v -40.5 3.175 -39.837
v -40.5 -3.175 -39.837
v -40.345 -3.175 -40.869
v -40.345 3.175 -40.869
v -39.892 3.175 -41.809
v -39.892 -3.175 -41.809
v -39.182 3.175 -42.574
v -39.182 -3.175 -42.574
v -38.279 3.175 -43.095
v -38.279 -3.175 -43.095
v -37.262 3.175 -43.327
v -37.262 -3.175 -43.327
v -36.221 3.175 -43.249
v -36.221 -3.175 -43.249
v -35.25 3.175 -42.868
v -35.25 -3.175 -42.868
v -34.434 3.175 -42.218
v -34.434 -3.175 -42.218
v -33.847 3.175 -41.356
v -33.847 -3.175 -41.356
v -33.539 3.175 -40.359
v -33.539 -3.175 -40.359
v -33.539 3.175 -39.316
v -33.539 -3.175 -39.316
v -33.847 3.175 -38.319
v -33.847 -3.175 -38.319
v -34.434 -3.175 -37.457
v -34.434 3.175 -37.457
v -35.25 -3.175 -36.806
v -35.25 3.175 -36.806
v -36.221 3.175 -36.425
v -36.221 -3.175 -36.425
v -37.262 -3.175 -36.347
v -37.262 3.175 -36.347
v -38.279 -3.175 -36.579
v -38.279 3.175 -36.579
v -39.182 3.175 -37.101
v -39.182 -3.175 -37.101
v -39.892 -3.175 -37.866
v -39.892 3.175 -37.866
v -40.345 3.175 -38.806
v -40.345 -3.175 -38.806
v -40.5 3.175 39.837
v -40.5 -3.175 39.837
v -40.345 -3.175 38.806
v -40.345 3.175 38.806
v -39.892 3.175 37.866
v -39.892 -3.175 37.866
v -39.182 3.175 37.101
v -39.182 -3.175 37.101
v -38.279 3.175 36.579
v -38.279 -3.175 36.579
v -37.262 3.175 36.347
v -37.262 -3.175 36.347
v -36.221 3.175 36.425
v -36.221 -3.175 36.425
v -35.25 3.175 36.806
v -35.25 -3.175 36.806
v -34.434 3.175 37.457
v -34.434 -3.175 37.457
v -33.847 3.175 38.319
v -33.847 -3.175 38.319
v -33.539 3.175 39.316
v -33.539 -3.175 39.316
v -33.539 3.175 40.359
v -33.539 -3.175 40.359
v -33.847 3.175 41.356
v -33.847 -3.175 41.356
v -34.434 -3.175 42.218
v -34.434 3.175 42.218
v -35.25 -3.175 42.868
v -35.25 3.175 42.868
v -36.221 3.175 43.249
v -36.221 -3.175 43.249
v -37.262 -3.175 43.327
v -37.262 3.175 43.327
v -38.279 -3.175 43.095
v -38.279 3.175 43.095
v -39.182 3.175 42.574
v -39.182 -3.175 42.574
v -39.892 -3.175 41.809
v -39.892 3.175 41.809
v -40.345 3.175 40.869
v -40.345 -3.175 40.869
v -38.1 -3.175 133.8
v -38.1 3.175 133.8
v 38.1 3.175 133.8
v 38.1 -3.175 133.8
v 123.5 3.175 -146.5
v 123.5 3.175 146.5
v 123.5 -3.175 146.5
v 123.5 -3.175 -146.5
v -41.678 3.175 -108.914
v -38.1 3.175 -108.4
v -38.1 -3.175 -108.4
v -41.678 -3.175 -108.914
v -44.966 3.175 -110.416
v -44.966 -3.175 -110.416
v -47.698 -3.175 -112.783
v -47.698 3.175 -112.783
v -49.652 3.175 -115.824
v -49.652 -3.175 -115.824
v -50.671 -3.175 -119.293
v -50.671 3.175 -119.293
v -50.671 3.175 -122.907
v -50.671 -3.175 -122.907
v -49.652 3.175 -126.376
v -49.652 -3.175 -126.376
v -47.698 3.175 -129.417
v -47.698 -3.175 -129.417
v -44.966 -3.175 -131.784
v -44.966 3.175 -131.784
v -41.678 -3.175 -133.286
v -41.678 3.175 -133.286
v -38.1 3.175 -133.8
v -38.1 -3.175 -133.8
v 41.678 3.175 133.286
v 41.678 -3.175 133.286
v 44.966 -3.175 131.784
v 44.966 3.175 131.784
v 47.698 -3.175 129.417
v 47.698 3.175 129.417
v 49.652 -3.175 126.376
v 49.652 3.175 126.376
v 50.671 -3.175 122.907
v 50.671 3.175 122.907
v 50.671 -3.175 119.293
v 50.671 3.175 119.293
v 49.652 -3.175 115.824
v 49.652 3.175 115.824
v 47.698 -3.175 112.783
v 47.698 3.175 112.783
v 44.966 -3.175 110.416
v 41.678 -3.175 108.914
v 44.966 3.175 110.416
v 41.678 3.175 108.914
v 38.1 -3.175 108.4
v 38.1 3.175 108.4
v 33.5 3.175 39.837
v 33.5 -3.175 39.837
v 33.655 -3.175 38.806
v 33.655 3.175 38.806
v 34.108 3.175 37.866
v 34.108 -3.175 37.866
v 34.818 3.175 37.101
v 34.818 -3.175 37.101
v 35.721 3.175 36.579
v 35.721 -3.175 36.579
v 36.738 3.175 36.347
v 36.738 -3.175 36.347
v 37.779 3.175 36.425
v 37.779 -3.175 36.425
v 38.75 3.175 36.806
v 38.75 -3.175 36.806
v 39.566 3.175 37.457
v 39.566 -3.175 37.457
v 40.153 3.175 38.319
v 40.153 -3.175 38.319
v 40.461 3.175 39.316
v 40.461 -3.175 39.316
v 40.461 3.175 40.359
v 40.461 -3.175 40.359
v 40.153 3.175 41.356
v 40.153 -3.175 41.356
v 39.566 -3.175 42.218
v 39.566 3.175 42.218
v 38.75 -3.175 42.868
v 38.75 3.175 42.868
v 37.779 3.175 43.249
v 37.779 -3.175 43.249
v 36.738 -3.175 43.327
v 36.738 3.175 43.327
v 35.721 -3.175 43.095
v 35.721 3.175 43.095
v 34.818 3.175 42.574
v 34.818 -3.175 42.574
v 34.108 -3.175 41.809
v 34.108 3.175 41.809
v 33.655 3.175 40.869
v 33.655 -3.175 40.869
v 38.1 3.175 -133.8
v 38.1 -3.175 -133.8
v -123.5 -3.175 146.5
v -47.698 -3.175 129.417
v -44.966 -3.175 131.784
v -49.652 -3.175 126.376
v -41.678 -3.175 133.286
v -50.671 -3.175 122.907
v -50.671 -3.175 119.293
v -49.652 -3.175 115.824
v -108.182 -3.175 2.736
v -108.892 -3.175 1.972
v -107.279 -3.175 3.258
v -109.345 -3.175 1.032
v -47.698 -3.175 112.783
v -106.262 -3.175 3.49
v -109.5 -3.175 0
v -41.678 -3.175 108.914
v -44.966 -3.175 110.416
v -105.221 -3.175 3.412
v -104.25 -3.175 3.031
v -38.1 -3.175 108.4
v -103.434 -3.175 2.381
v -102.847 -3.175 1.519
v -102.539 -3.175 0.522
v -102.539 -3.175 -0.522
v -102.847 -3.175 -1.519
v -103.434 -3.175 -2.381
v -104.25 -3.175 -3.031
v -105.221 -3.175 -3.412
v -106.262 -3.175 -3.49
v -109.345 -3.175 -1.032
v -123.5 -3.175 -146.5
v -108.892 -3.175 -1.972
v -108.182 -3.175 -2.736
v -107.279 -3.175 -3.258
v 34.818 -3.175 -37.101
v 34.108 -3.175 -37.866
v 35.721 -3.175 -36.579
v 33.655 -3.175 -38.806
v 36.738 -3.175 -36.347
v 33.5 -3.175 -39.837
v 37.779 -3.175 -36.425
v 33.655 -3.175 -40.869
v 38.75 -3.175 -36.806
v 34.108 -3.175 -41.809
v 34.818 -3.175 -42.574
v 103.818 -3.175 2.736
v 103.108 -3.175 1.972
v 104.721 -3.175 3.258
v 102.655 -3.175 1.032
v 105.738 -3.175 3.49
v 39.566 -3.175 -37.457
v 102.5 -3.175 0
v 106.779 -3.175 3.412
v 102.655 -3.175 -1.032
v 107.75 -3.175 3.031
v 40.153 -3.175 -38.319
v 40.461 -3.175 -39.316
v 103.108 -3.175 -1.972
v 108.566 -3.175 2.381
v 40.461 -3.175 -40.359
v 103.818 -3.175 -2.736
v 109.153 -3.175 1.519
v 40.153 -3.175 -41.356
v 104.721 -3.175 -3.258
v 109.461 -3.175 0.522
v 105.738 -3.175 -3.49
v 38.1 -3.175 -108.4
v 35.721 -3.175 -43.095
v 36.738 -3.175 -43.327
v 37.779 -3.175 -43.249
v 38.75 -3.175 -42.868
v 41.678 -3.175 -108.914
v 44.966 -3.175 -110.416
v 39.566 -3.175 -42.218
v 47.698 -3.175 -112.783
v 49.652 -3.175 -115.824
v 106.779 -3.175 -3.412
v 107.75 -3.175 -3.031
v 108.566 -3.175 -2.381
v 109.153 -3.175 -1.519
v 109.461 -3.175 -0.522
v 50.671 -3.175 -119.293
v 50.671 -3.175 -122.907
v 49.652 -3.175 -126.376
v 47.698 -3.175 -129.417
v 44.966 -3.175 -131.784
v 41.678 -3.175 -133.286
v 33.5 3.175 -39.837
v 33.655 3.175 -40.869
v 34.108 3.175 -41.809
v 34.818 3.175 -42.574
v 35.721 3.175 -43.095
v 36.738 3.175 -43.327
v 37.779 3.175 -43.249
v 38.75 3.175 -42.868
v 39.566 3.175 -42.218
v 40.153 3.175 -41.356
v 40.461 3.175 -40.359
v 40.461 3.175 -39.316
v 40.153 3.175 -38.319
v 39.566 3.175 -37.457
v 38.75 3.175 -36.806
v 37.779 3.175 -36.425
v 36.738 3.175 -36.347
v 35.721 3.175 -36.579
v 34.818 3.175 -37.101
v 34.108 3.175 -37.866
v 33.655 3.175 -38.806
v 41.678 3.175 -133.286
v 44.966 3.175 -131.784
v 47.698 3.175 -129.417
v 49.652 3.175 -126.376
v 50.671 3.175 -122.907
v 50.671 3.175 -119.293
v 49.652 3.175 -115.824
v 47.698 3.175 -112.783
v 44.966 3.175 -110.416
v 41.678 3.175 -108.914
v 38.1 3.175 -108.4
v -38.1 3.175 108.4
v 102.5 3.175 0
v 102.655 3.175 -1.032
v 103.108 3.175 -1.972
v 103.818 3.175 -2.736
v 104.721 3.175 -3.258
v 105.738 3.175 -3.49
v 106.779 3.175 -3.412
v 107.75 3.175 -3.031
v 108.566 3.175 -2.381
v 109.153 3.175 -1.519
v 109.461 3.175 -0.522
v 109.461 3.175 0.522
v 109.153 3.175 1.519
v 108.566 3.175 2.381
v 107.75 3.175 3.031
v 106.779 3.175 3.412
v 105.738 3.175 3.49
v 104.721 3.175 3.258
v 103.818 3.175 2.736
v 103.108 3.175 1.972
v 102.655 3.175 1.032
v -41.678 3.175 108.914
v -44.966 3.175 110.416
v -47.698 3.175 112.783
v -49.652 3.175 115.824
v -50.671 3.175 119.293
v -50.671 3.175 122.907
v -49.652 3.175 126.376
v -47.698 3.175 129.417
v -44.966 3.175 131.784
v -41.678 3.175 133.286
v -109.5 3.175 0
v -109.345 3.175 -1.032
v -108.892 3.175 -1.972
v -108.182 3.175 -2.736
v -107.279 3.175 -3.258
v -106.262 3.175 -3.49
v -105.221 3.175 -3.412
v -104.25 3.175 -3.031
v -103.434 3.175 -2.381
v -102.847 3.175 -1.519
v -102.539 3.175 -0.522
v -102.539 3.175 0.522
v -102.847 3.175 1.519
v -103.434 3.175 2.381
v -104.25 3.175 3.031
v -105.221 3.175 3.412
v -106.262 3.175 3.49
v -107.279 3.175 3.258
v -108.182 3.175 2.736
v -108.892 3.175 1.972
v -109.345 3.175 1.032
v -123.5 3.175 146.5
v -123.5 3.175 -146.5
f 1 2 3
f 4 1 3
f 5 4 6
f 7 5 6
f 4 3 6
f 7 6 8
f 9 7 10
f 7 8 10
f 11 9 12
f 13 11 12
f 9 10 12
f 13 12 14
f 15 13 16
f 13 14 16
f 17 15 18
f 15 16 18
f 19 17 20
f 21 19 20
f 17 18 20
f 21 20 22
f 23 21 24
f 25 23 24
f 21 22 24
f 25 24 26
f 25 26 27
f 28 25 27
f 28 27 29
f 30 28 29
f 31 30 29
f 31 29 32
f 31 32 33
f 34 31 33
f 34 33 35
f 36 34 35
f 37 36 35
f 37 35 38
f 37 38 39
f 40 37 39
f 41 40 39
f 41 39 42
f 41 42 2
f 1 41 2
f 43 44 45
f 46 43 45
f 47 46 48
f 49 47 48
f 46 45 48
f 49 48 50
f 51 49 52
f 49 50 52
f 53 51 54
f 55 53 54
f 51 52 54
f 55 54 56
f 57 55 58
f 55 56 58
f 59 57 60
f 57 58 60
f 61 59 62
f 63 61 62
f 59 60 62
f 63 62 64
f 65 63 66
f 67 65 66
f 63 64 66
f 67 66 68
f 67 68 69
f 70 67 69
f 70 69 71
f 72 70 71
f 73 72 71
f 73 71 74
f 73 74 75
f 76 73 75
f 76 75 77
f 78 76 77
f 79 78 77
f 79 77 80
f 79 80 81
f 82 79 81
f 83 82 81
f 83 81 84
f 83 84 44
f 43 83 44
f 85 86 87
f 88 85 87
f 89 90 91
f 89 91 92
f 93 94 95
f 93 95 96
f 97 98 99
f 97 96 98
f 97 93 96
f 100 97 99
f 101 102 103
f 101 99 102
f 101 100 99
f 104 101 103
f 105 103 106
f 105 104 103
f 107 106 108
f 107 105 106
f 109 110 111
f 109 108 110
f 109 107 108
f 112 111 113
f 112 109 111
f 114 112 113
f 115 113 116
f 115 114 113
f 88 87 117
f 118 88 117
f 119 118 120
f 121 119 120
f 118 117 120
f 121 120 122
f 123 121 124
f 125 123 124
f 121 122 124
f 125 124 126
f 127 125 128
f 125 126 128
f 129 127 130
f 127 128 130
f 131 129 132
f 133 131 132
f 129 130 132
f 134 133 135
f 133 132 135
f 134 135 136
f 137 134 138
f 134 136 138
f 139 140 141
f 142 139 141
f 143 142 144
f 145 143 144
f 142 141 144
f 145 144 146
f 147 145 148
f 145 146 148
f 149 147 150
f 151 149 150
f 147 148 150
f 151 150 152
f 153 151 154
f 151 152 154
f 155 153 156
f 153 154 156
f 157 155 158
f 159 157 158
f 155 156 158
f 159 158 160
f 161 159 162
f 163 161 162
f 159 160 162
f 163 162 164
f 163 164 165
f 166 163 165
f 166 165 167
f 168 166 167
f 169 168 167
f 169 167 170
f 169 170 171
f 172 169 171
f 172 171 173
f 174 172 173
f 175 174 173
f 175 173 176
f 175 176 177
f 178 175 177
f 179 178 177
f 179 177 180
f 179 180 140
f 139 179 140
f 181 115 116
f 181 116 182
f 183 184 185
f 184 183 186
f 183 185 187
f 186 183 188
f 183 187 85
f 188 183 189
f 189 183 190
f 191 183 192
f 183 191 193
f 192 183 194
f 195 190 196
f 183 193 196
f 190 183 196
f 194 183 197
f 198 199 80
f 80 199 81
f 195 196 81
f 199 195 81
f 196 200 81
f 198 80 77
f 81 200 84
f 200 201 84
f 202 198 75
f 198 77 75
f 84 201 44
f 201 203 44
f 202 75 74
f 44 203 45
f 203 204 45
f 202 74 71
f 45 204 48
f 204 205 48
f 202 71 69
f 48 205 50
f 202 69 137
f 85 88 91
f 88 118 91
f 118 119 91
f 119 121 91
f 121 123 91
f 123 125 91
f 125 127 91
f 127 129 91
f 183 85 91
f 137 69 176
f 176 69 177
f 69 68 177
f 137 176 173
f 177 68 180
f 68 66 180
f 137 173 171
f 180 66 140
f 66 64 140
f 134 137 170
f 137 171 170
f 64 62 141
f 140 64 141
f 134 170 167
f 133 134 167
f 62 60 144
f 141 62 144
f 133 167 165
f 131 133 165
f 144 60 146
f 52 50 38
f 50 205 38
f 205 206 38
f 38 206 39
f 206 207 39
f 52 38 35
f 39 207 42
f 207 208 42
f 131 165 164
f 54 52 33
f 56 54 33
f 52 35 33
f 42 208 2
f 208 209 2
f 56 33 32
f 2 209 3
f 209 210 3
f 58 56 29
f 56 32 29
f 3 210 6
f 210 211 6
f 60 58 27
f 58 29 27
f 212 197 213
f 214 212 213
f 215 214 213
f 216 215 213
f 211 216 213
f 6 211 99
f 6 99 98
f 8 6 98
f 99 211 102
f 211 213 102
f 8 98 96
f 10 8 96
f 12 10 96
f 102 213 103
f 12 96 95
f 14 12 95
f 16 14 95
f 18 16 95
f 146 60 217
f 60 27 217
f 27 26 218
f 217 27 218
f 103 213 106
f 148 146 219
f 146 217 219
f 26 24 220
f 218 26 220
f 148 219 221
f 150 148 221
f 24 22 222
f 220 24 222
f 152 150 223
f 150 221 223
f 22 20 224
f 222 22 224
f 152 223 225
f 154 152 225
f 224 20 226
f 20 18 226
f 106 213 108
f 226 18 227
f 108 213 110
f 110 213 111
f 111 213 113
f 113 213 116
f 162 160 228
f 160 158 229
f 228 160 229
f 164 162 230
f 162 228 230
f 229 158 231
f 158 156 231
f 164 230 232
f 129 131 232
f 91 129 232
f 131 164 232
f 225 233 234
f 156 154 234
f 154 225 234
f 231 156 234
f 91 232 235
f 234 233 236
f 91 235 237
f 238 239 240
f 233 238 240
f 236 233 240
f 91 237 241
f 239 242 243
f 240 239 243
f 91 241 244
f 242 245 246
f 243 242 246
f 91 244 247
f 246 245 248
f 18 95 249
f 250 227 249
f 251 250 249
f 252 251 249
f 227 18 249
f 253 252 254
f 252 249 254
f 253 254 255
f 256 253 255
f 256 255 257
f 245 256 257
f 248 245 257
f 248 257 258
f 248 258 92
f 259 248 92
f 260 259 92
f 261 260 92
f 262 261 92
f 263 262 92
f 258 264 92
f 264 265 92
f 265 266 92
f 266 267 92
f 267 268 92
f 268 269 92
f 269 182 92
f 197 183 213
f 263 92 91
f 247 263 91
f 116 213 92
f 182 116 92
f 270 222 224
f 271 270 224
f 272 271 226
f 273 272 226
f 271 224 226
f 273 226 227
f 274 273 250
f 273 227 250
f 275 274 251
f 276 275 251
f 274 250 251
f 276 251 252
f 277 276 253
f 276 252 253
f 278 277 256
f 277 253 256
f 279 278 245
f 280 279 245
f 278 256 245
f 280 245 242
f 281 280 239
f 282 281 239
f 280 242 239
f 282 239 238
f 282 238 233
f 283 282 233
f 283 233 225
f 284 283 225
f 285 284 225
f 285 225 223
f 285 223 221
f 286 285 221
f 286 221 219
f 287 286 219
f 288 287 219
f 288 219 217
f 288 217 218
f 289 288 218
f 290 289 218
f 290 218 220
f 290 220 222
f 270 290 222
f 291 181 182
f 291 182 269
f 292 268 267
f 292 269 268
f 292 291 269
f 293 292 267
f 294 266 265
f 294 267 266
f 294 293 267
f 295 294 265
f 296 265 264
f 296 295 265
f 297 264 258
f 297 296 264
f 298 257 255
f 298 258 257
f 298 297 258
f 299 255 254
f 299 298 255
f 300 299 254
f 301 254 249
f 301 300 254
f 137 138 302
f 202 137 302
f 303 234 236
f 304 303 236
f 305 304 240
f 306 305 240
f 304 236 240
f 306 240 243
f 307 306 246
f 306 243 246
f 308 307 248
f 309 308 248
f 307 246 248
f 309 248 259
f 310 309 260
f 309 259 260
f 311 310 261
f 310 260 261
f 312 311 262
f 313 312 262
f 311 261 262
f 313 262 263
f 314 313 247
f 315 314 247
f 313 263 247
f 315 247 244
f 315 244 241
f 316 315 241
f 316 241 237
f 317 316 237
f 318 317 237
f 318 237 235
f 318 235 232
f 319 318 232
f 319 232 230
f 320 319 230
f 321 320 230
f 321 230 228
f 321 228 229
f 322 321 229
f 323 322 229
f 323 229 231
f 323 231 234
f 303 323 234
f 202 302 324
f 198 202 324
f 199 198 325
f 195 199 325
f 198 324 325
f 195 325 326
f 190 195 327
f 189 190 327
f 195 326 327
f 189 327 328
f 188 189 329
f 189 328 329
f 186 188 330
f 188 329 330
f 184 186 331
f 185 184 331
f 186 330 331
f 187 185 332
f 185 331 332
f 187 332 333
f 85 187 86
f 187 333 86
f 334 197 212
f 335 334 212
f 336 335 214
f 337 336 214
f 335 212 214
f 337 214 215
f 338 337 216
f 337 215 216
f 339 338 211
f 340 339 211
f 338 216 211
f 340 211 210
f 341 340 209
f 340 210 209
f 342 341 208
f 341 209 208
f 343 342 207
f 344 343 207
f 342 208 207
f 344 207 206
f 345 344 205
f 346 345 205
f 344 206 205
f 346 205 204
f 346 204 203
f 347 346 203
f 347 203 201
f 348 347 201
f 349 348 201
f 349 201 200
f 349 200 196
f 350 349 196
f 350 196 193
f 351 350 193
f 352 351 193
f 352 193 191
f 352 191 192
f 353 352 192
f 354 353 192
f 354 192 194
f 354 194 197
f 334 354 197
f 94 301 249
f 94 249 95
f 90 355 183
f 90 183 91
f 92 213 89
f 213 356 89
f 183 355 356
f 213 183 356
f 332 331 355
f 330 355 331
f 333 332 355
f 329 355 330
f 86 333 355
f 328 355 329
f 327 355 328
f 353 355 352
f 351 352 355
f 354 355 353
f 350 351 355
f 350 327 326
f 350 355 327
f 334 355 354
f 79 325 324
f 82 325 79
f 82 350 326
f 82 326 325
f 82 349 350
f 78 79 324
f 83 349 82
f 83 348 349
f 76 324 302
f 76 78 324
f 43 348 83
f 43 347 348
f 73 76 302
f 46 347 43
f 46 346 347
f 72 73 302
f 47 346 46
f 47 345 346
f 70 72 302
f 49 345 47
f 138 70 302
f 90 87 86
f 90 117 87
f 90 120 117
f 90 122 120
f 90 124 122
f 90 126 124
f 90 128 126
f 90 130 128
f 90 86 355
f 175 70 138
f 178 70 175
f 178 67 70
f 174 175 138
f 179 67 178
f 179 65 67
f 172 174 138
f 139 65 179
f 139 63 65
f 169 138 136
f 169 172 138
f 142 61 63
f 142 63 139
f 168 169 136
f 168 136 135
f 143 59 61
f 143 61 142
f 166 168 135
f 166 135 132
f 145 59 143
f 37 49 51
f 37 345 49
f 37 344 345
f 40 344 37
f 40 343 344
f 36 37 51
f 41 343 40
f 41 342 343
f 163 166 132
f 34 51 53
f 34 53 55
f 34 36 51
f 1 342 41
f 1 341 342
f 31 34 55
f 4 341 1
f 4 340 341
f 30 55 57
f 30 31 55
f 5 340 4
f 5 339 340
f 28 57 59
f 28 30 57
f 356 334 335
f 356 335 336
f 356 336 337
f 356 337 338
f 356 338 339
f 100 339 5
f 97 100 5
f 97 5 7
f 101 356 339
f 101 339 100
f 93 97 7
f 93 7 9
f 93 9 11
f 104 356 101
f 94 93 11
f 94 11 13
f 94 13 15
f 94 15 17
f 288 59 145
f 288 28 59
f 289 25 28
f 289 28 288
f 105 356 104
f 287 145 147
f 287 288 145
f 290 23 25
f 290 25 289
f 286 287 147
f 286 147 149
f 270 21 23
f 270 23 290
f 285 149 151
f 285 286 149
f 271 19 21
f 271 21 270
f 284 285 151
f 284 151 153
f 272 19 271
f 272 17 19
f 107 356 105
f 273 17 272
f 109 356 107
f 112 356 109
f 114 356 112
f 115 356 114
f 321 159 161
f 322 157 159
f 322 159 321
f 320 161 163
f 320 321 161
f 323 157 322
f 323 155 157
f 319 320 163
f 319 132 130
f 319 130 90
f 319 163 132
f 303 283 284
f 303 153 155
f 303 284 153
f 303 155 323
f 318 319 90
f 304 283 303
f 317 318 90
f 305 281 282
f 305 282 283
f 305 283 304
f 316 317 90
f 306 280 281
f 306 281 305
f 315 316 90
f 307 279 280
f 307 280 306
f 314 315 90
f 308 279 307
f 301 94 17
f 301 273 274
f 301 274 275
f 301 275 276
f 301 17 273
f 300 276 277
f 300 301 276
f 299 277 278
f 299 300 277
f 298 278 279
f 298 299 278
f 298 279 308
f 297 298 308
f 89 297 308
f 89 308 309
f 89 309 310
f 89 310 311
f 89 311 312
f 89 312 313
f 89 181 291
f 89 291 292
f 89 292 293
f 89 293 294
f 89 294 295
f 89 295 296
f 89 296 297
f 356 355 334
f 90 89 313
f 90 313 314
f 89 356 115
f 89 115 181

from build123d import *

# Parameters (mm, degrees)
SKETCH1_W         = 247
SKETCH1_H         = 293
MAIN_BASE_DEPTH   = 3.175
HANDLES_DEPTH     = 192.715472772
ALIGNMENT_HOLES_D = 6.99999997


with BuildPart() as part:
    # Sketch1 → Main Base (new, symmetric)
    with BuildSketch(Plane(origin=(0, 0, 0), x_dir=(1, 0, 0), z_dir=(0, 1, 0))):
        Rectangle(SKETCH1_W, SKETCH1_H)
    extrude(amount=MAIN_BASE_DEPTH, both=True)

    # Sketch2 → Handles (cut, through all)
    with BuildSketch(Plane(origin=(0, 3.175, 0), x_dir=(1, 0, 0), z_dir=(0, 1, 0))):
        with BuildLine():
            Line((-38.1, 133.8), (38.1, 133.8))
            ThreePointArc((38.1, 133.8), (50.8, 121.1), (38.1, 108.4))
            Line((38.1, 108.4), (-38.1, 108.4))
            ThreePointArc((-38.1, 108.4), (-50.8, 121.1), (-38.1, 133.8))
        make_face()
        with BuildLine():
            Line((-38.1, -133.8), (38.1, -133.8))
            ThreePointArc((38.1, -133.8), (50.8, -121.1), (38.1, -108.4))
            Line((38.1, -108.4), (-38.1, -108.4))
            ThreePointArc((-38.1, -108.4), (-50.8, -121.1), (-38.1, -133.8))
        make_face()
    extrude(amount=-HANDLES_DEPTH, mode=Mode.SUBTRACT)

    # Alignment Holes (through all)
    with Locations(Plane(origin=(0, 3.175, 0), x_dir=(1, 0, 0), z_dir=(0, 1, 0))):
        with Locations((-106, 0), (-37, -39.837168574), (-37, 39.837168574), (37, 39.837168574), (37, -39.837168574), (106, 0)):
            Hole(ALIGNMENT_HOLES_D / 2)


solid = part.part
